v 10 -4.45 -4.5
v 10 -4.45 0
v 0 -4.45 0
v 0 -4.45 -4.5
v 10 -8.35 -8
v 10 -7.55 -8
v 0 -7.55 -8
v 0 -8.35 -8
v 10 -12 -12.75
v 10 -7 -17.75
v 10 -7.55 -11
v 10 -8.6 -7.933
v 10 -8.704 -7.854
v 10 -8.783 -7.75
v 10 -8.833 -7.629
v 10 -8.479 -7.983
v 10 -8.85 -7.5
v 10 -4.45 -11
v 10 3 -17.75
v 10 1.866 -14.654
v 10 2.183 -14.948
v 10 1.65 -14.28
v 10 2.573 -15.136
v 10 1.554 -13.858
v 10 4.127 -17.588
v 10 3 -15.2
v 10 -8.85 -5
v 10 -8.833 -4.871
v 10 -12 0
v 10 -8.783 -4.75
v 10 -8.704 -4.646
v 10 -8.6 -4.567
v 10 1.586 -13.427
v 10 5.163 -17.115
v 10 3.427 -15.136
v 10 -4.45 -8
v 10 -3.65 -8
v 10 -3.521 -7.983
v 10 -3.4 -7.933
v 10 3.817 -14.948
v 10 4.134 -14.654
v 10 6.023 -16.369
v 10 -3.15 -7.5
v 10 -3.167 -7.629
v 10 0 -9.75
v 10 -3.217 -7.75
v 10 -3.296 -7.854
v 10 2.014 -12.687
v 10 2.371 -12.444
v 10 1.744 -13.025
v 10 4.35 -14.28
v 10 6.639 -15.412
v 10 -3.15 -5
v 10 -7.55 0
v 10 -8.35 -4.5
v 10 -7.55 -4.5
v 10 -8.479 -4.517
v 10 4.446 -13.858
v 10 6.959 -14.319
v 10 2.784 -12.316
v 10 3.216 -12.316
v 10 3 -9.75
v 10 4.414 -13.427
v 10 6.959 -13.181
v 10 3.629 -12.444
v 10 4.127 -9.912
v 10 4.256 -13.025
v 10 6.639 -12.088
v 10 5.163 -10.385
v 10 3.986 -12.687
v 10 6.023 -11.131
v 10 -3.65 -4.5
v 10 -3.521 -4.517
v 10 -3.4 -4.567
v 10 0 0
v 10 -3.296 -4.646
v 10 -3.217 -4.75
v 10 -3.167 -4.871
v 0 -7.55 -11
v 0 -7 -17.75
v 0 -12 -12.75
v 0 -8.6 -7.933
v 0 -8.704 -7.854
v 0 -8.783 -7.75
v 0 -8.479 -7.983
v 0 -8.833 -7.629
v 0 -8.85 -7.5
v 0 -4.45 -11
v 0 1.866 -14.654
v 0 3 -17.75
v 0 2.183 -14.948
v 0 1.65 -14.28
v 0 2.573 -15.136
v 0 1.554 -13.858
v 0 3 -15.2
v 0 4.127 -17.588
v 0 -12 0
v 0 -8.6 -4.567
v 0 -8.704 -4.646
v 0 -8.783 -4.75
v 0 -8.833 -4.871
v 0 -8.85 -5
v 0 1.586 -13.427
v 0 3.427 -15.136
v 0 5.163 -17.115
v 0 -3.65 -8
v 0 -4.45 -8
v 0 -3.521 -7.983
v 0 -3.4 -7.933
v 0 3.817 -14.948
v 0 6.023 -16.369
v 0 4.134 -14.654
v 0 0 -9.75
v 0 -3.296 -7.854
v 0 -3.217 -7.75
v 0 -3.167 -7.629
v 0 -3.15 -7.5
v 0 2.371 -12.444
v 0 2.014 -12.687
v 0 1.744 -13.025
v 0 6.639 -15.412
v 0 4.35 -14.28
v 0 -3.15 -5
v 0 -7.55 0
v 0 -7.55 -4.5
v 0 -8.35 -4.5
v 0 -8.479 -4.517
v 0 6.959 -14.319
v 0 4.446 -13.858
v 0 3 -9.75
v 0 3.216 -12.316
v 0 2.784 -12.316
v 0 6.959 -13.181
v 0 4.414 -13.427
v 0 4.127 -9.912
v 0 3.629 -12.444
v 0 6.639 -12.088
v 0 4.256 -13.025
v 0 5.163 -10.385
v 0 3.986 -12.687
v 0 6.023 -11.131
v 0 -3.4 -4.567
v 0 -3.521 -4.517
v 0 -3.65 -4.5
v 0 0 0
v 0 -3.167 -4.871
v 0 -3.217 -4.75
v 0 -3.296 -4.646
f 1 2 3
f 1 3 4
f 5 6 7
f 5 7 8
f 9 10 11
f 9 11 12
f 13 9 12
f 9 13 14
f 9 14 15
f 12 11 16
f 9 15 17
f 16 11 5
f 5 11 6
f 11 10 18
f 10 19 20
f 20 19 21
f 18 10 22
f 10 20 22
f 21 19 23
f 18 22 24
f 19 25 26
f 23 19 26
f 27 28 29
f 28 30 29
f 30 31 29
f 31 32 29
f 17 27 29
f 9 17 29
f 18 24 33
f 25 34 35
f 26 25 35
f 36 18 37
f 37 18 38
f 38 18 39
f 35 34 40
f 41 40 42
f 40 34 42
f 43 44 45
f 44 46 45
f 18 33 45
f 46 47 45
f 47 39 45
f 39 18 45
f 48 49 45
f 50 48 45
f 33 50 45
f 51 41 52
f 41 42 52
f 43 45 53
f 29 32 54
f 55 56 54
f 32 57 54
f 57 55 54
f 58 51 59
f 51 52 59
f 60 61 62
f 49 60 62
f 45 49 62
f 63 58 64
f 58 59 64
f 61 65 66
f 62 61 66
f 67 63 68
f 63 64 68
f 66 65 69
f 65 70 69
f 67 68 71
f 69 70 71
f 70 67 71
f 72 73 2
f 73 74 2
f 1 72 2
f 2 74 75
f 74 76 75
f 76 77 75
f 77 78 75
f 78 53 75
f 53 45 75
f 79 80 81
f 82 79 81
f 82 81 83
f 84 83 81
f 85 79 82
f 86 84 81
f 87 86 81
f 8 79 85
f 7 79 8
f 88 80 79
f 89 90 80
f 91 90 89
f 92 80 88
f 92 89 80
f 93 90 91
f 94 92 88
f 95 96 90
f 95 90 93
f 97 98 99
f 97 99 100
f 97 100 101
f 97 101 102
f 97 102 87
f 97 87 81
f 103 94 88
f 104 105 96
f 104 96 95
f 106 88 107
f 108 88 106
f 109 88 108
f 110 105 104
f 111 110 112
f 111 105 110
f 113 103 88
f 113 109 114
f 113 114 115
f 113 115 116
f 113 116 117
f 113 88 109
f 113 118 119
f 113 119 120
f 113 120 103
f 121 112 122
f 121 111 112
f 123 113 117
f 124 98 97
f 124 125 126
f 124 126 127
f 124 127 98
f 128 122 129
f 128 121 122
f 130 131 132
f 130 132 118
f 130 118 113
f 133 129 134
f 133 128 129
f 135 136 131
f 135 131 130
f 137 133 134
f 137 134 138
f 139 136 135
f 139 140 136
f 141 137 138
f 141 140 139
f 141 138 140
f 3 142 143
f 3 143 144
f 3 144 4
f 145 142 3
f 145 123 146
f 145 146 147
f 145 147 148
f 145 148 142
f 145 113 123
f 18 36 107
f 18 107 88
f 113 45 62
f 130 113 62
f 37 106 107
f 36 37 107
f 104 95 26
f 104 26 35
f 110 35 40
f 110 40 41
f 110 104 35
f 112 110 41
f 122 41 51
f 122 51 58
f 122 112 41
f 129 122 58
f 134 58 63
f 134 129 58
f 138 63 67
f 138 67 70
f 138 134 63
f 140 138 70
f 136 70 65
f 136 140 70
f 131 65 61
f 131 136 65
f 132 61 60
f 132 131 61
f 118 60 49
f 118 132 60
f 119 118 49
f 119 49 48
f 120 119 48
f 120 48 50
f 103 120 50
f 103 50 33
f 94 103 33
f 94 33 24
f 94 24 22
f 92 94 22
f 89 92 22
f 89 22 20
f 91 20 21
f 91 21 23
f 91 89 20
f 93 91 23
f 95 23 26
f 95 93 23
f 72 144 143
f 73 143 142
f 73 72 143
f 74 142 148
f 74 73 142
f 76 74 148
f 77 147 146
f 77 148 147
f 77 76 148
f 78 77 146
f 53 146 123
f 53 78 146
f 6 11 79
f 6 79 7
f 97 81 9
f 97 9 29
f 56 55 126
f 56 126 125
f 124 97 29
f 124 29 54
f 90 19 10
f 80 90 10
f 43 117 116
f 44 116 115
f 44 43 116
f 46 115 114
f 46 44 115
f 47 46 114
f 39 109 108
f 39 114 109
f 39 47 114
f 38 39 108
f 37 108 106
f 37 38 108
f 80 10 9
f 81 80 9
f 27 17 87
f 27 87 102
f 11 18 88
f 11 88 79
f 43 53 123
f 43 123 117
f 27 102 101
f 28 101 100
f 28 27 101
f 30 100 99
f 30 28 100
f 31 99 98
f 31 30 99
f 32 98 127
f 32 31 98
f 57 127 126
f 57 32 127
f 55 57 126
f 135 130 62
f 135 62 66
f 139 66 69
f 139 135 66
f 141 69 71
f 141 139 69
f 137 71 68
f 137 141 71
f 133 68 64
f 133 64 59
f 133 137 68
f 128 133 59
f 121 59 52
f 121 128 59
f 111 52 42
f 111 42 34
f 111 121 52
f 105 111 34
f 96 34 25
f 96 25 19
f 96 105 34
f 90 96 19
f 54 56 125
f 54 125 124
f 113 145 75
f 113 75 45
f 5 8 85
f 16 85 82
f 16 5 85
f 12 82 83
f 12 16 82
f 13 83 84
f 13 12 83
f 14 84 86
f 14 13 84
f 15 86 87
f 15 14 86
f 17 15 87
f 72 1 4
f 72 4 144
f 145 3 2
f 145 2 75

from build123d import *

# Parameters (mm, degrees)
SKETCH1_R           = 1.45
BOSS_EXTRUDE1_DEPTH = 10
CUT_EXTRUDE1_DEPTH  = 73.480414599
SKETCH3_OUTSIDE_W   = 79.465
SKETCH3_OUTSIDE_H   = 60.027
CUT_EXTRUDE2_DEPTH  = 10


with BuildPart() as part:
    # Sketch1 → Boss-Extrude1 (new body)
    with BuildSketch(Plane(origin=(0, 0, 0), x_dir=(0, 0, -1), z_dir=(1, 0, 0))):
        with BuildLine():
            Line((0, 0), (9.75, 0))
            Line((9.75, 0), (9.75, 3))
            ThreePointArc((9.75, 3), (13.75, 7), (17.75, 3))
            Line((17.75, 3), (17.75, -2.652410493))
            Line((17.75, -2.652410493), (60.297873163, -28.367393861))
            ThreePointArc((60.297873163, -28.367393861), (61.652223967, -33.859727964), (56.159889865, -35.214078769))
            Line((56.159889865, -35.214078769), (17.75, -12))
            Line((17.75, -12), (0, -12))
            Line((0, -12), (0, 0))
        make_face()
        with Locations((13.75, 3)):
            Circle(SKETCH1_R, mode=Mode.SUBTRACT)
        with Locations((58.228881514, -31.790736315)):
            Circle(SKETCH1_R, mode=Mode.SUBTRACT)
    extrude(amount=BOSS_EXTRUDE1_DEPTH)

    # Sketch2 → Cut-Extrude1 (cut, through all)
    with BuildSketch(Plane(origin=(10, 0, 0), x_dir=(0, 0, -1), z_dir=(1, 0, 0))):
        with BuildLine():
            Line((0, -7.55), (0, -4.45))
            Line((0, -4.45), (4.5, -4.45))
            Line((4.5, -4.45), (4.5, -3.65))
            ThreePointArc((4.5, -3.65), (4.646446609, -3.296446609), (5, -3.15))
            Line((5, -3.15), (7.5, -3.15))
            ThreePointArc((7.5, -3.15), (7.853553391, -3.296446609), (8, -3.65))
            Line((8, -3.65), (8, -4.45))
            Line((8, -4.45), (11, -4.45))
            Line((11, -4.45), (11, -7.55))
            Line((11, -7.55), (8, -7.55))
            Line((8, -7.55), (8, -8.35))
            ThreePointArc((8, -8.35), (7.853553391, -8.703553391), (7.5, -8.85))
            Line((7.5, -8.85), (5, -8.85))
            ThreePointArc((5, -8.85), (4.646446609, -8.703553391), (4.5, -8.35))
            Line((4.5, -8.35), (4.5, -7.55))
            Line((4.5, -7.55), (0, -7.55))
        make_face()
    extrude(amount=-CUT_EXTRUDE1_DEPTH, mode=Mode.SUBTRACT)

    # Sketch3 outside → Cut-Extrude2 (cut)
    with BuildSketch(Plane(origin=(10, 0, 0), x_dir=(0, 0, -1), z_dir=(1, 0, 0))):
        with Locations((31.1145, -14.3955)):
            Rectangle(SKETCH3_OUTSIDE_W, SKETCH3_OUTSIDE_H)
        Polygon((17.75, -7), (12.75, -12), (0, -12), (0, 0), (17.75, 43), align=None, mode=Mode.SUBTRACT)
    extrude(amount=-CUT_EXTRUDE2_DEPTH, mode=Mode.SUBTRACT)


solid = part.part
